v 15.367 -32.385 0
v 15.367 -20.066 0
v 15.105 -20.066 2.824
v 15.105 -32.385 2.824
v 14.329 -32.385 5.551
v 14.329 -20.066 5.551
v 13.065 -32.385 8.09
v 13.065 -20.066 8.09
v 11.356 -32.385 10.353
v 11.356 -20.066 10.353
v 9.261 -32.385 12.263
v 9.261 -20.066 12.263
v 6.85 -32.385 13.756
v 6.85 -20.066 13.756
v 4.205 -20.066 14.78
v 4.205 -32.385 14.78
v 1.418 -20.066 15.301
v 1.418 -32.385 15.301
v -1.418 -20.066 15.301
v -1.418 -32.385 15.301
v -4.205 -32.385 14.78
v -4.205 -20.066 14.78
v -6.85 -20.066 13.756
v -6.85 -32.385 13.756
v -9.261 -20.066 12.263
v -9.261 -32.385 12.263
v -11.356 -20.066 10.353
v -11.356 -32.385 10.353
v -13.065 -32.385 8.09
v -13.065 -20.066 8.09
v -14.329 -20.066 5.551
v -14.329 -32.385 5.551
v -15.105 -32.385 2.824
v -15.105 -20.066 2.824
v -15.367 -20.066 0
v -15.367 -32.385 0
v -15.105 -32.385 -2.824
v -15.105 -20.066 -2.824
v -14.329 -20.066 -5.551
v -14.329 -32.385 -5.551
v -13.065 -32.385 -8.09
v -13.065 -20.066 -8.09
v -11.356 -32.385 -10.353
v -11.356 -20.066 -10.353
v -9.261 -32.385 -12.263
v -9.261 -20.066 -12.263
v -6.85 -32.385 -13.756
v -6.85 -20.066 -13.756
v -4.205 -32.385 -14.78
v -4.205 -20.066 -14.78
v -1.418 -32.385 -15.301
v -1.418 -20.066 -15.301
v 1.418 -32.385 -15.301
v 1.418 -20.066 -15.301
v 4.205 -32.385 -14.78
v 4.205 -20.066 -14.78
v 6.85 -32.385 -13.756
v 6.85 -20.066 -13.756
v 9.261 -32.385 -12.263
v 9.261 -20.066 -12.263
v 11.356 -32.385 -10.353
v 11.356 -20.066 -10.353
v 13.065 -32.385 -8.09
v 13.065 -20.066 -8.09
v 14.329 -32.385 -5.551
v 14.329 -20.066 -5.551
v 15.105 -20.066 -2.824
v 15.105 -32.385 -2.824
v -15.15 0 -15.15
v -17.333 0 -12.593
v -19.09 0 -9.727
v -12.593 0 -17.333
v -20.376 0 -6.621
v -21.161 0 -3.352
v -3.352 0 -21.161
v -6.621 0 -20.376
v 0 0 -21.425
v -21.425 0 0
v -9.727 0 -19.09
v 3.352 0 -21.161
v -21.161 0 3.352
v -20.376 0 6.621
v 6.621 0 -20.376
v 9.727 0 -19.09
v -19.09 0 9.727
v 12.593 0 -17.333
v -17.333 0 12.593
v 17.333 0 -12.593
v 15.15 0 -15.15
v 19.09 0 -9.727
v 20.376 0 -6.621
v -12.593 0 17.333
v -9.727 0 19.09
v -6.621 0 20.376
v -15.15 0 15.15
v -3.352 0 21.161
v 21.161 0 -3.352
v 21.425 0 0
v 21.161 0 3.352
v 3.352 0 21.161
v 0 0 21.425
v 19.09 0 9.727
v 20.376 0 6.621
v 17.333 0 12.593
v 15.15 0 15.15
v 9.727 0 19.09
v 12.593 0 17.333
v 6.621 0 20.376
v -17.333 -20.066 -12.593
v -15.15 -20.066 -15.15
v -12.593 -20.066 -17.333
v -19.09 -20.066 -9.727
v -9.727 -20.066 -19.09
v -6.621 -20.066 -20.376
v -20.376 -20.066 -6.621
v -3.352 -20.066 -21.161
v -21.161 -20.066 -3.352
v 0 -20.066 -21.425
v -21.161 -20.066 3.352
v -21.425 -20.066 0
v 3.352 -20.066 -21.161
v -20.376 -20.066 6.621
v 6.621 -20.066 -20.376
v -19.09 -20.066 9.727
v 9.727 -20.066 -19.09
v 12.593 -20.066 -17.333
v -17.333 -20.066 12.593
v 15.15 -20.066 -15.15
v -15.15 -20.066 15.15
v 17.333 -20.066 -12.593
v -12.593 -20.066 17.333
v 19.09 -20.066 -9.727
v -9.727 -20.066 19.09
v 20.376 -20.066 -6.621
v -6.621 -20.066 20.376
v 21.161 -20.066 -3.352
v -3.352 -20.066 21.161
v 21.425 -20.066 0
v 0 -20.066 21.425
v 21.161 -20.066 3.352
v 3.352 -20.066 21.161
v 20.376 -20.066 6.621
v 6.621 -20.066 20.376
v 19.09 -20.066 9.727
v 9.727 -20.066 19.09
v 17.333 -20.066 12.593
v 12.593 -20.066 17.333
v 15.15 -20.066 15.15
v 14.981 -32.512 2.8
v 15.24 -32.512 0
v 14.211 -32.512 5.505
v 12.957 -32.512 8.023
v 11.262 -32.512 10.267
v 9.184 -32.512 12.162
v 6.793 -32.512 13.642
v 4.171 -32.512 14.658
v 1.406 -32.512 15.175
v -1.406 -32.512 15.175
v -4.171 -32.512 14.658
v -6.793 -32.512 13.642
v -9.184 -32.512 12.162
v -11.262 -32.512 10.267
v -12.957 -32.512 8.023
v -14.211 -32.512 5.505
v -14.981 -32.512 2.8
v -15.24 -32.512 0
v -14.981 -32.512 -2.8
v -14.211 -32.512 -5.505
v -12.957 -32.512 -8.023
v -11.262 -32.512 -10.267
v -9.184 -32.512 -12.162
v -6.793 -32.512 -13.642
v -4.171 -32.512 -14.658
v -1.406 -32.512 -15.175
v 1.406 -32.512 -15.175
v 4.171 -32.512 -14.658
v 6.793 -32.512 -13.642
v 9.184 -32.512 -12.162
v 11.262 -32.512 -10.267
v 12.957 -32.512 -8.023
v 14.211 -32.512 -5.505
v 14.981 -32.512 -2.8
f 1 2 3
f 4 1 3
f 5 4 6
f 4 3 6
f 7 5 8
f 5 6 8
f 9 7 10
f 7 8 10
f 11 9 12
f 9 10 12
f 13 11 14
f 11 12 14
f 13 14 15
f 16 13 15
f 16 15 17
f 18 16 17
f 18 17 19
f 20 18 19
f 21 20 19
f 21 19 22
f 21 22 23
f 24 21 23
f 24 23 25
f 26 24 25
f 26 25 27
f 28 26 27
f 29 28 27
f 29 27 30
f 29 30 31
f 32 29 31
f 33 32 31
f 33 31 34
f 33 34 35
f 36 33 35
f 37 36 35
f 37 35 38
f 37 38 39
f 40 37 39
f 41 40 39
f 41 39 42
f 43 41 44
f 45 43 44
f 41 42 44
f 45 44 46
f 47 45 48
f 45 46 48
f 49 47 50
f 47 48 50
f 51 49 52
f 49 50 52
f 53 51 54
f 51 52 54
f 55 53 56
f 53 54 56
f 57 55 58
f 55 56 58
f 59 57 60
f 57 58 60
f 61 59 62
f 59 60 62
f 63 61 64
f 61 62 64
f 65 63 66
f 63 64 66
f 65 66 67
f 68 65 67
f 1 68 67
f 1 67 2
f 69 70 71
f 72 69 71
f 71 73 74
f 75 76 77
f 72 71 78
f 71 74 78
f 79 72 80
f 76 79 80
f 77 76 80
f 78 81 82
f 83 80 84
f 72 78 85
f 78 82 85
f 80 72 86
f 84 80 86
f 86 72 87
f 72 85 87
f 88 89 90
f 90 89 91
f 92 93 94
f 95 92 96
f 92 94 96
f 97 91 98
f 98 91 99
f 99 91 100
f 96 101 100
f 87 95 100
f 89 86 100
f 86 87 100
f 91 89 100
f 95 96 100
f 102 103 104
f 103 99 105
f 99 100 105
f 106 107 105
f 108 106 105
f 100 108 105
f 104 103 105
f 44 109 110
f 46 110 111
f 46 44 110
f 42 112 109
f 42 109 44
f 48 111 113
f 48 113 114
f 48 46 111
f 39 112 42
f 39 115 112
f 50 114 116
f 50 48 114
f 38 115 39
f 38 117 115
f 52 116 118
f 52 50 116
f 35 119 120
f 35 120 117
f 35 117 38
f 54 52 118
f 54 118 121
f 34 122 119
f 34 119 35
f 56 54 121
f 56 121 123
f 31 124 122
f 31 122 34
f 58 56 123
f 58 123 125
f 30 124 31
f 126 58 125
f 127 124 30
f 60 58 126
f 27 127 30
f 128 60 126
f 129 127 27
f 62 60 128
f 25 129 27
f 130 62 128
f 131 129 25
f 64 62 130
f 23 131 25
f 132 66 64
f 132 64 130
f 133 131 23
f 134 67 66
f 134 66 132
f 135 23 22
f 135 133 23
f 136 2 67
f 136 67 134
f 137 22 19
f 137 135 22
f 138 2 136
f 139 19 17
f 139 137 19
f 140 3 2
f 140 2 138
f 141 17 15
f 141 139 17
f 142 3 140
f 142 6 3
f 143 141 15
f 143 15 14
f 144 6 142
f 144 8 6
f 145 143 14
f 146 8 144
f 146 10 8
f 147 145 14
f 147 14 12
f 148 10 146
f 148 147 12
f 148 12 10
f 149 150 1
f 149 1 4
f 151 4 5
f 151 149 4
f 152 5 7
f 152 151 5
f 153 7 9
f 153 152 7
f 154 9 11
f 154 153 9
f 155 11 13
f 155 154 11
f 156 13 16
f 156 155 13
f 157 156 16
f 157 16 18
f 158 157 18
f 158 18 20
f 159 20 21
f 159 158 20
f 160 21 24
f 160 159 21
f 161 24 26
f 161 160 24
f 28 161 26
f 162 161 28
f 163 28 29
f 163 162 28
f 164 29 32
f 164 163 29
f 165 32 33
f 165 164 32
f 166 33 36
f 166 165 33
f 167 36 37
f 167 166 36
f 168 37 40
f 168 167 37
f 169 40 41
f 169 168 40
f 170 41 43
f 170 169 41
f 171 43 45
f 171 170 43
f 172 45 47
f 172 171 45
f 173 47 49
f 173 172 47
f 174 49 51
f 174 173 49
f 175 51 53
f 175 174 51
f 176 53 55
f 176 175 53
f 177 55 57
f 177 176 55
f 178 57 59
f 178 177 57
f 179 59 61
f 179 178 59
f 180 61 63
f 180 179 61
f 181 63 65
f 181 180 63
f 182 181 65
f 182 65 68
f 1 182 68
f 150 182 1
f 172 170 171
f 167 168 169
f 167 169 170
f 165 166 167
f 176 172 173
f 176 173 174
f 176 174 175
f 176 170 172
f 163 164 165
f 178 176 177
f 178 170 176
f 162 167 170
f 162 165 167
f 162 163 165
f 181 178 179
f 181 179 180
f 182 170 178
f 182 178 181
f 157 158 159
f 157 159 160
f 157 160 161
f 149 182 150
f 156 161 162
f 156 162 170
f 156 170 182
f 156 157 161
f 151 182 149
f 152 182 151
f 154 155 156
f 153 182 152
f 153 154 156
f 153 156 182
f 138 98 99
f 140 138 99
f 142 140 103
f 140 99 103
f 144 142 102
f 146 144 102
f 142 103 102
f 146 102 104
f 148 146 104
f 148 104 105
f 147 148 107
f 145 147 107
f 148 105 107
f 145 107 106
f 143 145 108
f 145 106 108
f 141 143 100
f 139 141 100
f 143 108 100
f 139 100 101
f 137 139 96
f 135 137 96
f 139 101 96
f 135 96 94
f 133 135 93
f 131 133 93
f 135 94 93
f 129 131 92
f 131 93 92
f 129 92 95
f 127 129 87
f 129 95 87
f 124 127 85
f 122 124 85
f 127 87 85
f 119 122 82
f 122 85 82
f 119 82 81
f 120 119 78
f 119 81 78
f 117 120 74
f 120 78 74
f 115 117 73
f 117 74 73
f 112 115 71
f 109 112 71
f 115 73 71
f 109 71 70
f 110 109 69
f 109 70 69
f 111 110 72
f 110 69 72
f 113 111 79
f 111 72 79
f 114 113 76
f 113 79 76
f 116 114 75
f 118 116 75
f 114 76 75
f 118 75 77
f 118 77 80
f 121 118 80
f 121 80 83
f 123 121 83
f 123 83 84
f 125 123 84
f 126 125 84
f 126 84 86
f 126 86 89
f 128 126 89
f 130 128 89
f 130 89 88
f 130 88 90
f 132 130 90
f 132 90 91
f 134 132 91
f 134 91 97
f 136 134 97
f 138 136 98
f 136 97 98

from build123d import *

# Parameters (mm, degrees)
F0_R     = 21.4249
F0_R_2   = 15.367
F1_DEPTH = 20.066
F2_R     = 15.367
F3_DEPTH = 32.512
F4_SIZE2 = 0.127
F4_SIZE  = 0.127


with BuildPart() as f1:
    # F0 (on Front) → F1 (new body)
    with BuildSketch(Plane.XZ):
        Circle(F0_R)
        Circle(F0_R_2, mode=Mode.SUBTRACT)
        Circle(F0_R_2)
    extrude(amount=F1_DEPTH)

    # F2 (on Front) → F3 (join)
    with BuildSketch(Plane.XZ):
        Circle(F2_R)
    extrude(amount=F3_DEPTH)

    # F4
    f4_edges = [f1.edges().sort_by_distance(p)[0] for p in [
        (-15.367, -32.512, 0),
    ]]
    chamfer(f4_edges, length=F4_SIZE, length2=F4_SIZE2)


solid = f1.part
